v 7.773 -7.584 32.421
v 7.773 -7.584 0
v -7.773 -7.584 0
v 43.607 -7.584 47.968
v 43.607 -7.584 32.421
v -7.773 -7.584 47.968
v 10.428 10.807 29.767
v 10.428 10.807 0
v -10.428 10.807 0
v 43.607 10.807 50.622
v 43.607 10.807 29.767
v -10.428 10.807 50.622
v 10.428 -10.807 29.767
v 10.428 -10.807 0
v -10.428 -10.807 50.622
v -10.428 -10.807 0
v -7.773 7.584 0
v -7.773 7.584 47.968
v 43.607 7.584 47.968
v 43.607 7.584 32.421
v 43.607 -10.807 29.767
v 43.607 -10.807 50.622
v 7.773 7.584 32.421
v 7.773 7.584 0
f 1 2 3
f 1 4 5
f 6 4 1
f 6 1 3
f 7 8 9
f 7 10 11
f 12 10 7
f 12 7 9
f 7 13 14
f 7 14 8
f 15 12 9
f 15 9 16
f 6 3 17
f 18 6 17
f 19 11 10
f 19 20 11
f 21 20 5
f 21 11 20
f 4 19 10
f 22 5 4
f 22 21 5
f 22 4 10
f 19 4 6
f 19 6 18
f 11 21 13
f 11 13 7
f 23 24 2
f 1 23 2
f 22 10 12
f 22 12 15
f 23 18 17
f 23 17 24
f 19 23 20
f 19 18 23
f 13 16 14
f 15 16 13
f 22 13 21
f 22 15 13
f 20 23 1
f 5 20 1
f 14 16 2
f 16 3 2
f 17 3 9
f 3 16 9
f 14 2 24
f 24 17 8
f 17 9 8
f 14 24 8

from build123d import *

# Parameters (mm, degrees)
F1_W   = 20.855685696
F1_H   = 21.614074707
F1_W_2 = 15.5469644815
F1_H_2 = 15.1677737013


with BuildPart() as f2:
    # F2: sweep along a path in F0
    with BuildLine(Plane.XZ) as f2_path:
        Line((0, 0), (0, 40.1945970953))
        Line((0, 40.1945970953), (43.6073467135, 40.1945970953))
    # F1 (on Top) → F2 (sweep)
    with BuildSketch(Plane.XY):
        Rectangle(F1_W, F1_H)
        Rectangle(F1_W_2, F1_H_2, mode=Mode.SUBTRACT)
    sweep(path=f2_path.line, transition=Transition.RIGHT)


solid = f2.part
